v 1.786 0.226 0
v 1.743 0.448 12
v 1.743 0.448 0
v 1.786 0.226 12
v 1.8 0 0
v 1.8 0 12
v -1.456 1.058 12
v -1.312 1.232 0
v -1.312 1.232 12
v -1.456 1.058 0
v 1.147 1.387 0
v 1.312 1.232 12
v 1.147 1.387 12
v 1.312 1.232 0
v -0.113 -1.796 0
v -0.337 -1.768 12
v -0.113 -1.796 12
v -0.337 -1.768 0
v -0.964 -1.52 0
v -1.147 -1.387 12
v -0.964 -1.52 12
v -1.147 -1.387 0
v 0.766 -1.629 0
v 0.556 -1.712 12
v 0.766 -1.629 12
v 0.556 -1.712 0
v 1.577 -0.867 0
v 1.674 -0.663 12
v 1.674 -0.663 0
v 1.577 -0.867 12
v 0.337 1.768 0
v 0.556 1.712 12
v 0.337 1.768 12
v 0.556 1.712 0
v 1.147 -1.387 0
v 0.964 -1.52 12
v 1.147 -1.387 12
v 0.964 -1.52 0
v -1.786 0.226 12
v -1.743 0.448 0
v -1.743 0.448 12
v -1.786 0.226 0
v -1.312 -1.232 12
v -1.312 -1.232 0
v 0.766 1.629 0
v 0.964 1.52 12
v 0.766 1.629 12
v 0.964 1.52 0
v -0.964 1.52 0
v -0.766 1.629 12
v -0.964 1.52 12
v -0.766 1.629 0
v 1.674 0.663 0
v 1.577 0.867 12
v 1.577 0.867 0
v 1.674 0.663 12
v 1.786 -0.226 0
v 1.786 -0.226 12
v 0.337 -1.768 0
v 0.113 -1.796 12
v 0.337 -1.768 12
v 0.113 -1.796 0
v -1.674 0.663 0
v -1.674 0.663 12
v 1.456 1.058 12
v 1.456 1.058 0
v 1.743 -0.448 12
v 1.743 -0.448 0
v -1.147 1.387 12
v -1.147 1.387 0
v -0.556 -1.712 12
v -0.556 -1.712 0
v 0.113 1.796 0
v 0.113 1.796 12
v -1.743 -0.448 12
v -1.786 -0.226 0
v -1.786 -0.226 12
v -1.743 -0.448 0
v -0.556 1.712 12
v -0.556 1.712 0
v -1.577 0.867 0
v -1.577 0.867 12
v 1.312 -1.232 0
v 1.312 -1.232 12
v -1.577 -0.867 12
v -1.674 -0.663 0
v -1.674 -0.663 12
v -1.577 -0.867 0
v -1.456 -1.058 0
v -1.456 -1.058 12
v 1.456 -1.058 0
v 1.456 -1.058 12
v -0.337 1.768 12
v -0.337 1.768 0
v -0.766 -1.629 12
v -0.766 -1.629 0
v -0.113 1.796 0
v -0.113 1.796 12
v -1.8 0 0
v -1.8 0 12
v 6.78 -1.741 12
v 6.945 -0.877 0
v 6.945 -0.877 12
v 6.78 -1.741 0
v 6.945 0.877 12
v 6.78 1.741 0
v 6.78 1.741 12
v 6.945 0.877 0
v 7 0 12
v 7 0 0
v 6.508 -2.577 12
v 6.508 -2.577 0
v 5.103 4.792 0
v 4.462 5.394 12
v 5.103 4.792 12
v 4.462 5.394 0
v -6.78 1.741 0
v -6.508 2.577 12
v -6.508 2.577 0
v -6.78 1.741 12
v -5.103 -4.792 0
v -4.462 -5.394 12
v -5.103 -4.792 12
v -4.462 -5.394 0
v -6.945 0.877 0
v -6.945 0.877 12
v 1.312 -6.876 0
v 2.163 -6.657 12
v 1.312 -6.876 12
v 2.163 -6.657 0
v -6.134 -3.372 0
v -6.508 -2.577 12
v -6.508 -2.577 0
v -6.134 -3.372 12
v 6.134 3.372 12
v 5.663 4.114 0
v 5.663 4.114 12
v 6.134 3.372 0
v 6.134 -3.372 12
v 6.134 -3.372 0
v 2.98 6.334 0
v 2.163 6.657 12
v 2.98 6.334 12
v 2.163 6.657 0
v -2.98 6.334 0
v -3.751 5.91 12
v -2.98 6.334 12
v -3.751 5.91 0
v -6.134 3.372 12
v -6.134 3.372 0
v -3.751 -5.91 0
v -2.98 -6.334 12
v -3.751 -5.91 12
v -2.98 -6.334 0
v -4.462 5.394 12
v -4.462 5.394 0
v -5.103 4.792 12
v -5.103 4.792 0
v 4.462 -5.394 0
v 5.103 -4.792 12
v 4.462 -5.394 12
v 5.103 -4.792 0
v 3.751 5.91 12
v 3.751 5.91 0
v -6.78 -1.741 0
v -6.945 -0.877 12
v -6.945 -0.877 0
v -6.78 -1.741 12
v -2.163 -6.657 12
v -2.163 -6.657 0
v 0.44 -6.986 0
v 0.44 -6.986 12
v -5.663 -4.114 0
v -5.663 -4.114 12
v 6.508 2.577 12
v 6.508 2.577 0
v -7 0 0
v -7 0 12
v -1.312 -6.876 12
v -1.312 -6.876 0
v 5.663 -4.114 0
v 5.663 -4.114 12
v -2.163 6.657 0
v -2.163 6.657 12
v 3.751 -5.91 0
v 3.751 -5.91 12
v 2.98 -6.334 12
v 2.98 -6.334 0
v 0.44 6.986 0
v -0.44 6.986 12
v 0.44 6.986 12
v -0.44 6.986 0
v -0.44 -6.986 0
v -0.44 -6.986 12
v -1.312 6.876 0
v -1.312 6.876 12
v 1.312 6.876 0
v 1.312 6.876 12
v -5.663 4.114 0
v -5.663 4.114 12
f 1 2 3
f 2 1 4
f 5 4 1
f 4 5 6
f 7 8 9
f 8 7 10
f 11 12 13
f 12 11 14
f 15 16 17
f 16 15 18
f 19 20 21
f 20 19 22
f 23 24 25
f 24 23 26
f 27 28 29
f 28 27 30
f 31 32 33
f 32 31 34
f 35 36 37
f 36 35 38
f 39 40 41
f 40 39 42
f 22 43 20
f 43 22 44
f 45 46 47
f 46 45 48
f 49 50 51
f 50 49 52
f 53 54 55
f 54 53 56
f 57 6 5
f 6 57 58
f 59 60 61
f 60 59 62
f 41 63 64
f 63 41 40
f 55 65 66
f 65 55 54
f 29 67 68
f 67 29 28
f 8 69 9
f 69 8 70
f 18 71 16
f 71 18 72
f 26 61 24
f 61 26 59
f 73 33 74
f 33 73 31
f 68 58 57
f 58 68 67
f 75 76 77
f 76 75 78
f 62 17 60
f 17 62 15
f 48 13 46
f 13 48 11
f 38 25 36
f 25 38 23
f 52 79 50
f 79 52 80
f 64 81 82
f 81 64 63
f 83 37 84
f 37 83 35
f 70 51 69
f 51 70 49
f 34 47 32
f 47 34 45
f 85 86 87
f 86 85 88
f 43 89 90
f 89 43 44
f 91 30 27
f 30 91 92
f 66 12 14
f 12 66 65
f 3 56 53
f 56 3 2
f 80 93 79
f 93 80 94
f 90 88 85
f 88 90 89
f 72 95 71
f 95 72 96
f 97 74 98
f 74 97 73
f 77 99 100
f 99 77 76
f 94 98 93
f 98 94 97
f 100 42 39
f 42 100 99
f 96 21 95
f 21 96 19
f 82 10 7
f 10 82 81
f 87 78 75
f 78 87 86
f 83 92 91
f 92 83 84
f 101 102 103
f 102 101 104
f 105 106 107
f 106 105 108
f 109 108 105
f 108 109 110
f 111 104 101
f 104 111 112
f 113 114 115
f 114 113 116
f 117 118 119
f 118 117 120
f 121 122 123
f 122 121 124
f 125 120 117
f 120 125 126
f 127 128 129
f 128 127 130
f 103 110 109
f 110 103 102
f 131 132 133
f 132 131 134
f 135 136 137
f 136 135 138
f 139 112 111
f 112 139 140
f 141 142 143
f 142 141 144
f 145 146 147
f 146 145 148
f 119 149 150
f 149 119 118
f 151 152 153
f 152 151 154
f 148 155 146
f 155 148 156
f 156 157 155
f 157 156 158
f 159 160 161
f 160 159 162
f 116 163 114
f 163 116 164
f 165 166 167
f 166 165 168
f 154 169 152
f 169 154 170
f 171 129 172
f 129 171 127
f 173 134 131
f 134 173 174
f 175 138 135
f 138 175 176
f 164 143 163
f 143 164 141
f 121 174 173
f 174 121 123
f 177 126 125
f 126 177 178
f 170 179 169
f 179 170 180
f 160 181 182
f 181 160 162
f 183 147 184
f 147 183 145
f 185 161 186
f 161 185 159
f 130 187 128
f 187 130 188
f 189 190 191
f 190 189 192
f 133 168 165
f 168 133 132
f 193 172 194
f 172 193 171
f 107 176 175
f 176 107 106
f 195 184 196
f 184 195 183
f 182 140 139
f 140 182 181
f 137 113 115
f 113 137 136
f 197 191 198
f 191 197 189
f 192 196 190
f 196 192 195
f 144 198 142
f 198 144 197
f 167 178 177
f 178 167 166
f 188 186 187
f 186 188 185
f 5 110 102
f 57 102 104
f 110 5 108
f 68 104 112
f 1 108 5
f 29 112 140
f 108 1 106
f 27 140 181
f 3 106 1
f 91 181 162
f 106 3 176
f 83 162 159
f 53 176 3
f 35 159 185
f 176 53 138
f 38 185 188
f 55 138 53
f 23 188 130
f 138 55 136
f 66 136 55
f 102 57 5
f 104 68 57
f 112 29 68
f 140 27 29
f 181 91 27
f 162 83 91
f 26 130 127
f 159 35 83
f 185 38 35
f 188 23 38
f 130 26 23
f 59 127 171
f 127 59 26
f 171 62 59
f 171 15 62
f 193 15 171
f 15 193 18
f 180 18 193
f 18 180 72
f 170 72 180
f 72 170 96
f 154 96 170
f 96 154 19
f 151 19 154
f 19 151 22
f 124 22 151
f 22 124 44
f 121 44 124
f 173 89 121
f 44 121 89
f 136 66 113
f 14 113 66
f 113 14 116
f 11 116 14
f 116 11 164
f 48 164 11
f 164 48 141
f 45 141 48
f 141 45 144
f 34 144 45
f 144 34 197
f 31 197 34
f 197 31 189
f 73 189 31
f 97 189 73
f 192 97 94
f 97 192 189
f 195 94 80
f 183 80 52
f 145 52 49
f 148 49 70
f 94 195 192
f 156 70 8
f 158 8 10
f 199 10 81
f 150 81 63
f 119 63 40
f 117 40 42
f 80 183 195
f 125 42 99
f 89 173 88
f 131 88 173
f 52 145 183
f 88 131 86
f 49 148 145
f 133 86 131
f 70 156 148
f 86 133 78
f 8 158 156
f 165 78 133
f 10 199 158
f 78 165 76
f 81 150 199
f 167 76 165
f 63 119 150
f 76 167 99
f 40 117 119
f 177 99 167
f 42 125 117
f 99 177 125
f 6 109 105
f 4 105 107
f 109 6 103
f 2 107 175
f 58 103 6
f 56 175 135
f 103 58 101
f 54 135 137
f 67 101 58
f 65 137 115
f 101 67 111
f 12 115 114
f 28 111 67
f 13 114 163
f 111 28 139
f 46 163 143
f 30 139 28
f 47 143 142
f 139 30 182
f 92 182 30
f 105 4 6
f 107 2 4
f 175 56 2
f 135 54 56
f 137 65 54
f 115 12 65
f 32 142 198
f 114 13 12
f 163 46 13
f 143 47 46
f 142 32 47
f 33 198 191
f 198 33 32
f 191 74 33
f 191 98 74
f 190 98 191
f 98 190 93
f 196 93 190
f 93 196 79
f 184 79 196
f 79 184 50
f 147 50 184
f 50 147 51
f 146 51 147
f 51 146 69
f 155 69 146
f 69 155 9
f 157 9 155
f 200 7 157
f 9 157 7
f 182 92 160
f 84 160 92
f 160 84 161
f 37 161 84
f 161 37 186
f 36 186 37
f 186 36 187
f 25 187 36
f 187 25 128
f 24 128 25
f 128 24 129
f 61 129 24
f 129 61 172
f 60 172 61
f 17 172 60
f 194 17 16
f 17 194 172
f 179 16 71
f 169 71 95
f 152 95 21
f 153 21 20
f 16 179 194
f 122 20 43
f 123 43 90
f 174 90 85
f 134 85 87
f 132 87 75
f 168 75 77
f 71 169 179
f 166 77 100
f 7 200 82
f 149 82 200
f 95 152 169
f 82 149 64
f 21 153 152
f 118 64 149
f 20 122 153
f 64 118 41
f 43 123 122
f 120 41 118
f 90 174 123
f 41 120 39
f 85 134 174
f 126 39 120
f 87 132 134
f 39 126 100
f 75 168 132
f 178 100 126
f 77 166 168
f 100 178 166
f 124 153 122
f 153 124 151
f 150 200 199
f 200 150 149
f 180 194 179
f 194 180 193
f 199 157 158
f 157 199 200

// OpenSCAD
$fn = 50;


difference() {
	union() {
		cylinder(h = 12, r = 7.0000000000);
	}
	union() {
		translate(v = [0.0000000000, 0.0000000000, -100.0000000000]) {
			cylinder(h = 200, r = 1.8000000000);
		}
		cylinder(h = 12, r = 1.8000000000);
		cylinder(h = 12, r = 1.8000000000);
		cylinder(h = 12, r = 1.8000000000);
	}
}
